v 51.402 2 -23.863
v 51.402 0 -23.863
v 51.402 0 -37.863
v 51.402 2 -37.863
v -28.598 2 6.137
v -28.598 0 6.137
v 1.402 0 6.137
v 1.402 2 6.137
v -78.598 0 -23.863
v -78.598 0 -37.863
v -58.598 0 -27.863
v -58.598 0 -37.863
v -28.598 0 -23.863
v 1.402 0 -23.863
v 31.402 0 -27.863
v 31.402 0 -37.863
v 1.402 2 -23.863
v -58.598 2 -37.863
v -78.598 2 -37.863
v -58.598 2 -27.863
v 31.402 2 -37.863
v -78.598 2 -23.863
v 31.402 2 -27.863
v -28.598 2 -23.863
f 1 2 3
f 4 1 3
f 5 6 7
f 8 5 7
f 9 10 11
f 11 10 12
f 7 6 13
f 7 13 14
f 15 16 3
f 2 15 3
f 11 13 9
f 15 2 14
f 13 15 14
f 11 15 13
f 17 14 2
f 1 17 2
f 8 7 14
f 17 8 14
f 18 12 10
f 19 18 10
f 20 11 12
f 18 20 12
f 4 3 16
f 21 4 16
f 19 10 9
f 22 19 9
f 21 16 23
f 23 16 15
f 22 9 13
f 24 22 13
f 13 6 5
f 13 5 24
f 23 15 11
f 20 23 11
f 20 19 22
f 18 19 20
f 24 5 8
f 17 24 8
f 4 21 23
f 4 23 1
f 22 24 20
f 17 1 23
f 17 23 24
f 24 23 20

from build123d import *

# Parameters (mm, degrees)
SKETCH1_W           = 30
SKETCH1_H           = 30
BOSS_EXTRUDE1_DEPTH = 2


with BuildPart() as part:
    # Sketch1 → Boss-Extrude1 (new body)
    with BuildSketch(Plane(origin=(0, 0, 0), x_dir=(1, 0, 0), z_dir=(0, 1, 0))):
        Polygon((-78.598325024, 37.862631579), (-78.598325024, 23.862631579), (-28.598325024, 23.862631579), (1.401674976, 23.862631579), (51.401674976, 23.862631579), (51.401674976, 37.862631579), (31.401674976, 37.862631579), (31.401674976, 27.862631579), (-58.598325024, 27.862631579), (-58.598325024, 37.862631579), align=None)
        with Locations((-13.598325024, 8.862631579)):
            Rectangle(SKETCH1_W, SKETCH1_H)
    extrude(amount=BOSS_EXTRUDE1_DEPTH)


solid = part.part
